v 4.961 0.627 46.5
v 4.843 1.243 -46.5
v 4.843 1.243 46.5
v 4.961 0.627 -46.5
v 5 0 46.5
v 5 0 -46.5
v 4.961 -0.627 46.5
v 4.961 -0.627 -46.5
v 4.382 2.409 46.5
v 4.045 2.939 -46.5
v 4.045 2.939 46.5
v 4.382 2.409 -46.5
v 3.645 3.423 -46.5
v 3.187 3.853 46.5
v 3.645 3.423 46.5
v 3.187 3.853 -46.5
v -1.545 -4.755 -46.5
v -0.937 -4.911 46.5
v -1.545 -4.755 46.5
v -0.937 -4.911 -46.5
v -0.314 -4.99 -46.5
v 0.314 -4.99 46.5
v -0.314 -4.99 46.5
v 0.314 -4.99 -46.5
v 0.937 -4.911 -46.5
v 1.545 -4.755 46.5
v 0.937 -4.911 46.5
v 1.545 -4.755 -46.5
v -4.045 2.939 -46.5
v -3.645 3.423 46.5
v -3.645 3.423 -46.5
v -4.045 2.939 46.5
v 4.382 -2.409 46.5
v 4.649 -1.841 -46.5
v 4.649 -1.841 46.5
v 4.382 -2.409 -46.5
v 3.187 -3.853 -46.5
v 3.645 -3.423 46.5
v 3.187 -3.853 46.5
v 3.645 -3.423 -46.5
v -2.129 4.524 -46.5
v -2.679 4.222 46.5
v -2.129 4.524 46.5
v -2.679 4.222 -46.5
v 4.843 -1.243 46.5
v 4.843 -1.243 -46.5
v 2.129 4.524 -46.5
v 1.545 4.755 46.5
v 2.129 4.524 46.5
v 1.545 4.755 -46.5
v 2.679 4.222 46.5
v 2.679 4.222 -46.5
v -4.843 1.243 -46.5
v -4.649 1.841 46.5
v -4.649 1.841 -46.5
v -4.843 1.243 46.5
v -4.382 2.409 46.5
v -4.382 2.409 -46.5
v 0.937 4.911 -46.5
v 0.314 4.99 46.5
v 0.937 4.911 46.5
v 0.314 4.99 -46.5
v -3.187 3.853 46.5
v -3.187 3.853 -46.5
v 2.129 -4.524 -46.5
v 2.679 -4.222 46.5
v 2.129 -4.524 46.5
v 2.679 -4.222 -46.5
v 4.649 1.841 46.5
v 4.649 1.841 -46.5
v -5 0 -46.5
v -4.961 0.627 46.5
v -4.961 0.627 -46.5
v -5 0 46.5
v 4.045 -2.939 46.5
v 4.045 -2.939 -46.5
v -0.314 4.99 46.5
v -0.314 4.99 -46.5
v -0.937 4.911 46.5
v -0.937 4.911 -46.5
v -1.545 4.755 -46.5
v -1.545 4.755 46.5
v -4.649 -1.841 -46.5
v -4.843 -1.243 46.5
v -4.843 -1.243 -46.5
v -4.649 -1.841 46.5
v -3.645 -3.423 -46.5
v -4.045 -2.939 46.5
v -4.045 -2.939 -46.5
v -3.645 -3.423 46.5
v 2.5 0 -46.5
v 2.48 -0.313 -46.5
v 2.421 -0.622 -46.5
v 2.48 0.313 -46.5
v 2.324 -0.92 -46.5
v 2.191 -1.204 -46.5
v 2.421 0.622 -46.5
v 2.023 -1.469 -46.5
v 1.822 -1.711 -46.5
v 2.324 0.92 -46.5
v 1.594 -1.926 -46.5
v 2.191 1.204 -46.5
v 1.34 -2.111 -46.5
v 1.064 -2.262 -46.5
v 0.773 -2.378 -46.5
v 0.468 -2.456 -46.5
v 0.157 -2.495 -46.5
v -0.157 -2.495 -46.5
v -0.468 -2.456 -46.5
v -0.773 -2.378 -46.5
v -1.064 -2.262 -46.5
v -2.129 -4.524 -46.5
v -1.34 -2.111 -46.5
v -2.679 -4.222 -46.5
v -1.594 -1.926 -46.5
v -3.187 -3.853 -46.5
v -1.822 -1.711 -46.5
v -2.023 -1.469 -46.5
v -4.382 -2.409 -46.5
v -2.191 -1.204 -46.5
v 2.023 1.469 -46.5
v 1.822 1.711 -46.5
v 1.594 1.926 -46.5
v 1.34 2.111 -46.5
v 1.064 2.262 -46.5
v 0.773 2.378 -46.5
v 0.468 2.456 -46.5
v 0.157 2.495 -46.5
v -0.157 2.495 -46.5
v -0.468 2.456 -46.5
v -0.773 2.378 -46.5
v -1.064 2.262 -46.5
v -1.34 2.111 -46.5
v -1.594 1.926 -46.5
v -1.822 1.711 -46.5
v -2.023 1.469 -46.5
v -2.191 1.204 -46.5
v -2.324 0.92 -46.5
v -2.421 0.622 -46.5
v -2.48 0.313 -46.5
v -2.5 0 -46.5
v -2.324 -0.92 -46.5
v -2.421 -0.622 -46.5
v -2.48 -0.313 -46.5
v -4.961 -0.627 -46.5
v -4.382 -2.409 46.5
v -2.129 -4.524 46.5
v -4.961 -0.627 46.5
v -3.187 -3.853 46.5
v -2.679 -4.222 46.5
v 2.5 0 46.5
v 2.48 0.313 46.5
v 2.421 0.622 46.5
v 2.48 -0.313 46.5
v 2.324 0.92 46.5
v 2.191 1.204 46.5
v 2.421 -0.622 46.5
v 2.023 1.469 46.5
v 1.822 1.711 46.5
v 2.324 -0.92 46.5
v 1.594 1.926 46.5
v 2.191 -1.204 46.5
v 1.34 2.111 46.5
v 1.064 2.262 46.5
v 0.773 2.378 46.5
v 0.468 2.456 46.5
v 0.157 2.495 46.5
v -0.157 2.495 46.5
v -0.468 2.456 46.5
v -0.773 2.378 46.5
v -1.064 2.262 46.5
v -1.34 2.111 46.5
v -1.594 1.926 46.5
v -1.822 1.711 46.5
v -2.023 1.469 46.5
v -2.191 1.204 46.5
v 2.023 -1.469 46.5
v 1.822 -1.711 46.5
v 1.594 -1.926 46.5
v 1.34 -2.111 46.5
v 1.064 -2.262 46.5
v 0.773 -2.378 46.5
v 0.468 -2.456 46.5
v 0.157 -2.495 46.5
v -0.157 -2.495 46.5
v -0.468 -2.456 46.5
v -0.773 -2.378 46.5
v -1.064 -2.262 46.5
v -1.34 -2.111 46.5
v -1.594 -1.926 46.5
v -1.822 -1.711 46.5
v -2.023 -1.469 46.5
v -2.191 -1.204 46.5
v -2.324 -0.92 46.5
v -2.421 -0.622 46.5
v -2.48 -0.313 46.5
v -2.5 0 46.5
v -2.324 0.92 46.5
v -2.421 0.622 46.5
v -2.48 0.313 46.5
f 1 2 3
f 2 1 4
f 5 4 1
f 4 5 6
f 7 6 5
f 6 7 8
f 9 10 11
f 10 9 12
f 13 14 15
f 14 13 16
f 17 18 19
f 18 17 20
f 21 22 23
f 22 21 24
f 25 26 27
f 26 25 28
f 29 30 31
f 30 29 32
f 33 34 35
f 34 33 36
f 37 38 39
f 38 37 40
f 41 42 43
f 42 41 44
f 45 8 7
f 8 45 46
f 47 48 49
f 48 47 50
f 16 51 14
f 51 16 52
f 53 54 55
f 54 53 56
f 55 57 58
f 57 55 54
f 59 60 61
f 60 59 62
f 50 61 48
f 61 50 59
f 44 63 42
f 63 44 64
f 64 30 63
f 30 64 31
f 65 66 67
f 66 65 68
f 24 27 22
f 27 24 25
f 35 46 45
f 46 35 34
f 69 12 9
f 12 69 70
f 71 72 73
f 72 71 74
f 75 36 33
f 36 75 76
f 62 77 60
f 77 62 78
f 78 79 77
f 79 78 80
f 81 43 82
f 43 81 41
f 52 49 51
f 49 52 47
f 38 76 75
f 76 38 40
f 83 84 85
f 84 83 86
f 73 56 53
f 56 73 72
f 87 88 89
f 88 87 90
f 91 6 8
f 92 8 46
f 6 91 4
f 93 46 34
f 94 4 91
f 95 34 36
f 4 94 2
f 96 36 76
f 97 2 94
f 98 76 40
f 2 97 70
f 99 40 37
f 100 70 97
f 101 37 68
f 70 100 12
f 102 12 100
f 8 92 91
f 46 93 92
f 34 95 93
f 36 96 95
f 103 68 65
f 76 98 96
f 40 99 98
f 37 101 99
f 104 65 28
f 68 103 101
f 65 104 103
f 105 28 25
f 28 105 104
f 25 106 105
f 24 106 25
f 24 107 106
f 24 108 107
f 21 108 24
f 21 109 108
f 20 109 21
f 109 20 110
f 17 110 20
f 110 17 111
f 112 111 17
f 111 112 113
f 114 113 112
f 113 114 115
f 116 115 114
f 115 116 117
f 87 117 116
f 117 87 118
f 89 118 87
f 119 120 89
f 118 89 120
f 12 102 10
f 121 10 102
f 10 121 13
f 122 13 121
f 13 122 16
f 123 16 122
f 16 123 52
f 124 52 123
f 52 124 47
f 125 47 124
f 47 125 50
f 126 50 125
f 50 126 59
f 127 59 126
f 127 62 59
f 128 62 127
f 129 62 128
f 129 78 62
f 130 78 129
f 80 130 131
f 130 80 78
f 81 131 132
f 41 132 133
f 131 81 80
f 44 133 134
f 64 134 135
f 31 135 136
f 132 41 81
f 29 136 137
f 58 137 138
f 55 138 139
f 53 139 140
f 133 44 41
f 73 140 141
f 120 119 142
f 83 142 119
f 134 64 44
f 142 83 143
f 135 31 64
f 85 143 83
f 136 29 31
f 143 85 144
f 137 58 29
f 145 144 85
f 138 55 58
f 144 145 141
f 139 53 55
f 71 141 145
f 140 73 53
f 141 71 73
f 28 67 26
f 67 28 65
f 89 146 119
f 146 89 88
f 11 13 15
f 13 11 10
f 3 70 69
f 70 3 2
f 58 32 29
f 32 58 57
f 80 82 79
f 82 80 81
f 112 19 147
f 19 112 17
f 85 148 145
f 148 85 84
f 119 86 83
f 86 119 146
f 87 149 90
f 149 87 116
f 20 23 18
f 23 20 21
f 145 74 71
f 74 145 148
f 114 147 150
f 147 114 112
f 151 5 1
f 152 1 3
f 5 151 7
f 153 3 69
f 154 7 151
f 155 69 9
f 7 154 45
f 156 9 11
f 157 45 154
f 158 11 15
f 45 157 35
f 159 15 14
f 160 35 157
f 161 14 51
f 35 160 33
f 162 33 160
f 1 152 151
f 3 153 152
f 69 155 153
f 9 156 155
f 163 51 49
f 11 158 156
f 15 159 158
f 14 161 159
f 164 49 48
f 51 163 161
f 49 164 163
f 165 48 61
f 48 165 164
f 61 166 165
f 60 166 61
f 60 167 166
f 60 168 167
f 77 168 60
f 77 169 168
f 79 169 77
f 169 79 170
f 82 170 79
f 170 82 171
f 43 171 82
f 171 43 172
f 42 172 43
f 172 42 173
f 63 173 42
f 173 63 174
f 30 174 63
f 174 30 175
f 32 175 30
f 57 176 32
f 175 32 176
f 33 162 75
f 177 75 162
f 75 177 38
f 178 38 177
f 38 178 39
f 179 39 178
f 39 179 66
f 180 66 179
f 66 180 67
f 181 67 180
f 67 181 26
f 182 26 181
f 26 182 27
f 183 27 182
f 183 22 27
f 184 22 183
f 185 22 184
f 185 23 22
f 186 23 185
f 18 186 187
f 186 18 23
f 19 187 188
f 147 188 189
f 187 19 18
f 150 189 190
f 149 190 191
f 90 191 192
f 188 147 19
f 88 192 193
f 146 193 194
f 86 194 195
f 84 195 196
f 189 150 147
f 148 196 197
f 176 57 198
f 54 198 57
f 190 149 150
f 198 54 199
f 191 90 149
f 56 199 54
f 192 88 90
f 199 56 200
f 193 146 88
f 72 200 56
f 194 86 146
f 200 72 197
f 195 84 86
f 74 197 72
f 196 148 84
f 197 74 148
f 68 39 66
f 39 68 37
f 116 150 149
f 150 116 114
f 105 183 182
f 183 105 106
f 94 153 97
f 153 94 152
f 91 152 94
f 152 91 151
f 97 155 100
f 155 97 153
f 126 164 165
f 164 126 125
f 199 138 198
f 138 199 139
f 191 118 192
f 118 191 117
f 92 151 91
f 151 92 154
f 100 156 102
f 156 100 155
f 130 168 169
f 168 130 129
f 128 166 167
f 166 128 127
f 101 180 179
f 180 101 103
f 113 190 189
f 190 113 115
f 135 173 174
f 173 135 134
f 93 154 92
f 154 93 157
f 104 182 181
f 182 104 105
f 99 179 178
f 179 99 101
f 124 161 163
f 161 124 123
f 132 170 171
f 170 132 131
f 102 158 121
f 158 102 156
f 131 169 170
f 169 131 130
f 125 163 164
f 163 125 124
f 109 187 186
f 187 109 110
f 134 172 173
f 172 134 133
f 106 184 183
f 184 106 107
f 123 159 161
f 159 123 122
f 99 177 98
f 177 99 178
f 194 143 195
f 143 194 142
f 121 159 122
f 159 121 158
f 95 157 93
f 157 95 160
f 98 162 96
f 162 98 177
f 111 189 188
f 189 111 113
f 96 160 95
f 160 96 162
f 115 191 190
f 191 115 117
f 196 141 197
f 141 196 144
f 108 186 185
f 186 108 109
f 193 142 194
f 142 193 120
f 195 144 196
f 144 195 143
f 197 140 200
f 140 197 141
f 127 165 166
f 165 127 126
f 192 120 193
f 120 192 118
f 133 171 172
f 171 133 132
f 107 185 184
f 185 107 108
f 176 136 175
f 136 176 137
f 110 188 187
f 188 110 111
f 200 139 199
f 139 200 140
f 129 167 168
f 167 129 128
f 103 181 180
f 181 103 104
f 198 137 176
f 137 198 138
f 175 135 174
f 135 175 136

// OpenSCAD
$fn = 50;


difference() {
	union() {
		translate(v = [0, 0, -46.5000000000]) {
			cylinder(h = 93, r = 5.0000000000);
		}
	}
	union() {
		translate(v = [0, 0, -100.0000000000]) {
			cylinder(h = 200, r = 2.5000000000);
		}
	}
}
